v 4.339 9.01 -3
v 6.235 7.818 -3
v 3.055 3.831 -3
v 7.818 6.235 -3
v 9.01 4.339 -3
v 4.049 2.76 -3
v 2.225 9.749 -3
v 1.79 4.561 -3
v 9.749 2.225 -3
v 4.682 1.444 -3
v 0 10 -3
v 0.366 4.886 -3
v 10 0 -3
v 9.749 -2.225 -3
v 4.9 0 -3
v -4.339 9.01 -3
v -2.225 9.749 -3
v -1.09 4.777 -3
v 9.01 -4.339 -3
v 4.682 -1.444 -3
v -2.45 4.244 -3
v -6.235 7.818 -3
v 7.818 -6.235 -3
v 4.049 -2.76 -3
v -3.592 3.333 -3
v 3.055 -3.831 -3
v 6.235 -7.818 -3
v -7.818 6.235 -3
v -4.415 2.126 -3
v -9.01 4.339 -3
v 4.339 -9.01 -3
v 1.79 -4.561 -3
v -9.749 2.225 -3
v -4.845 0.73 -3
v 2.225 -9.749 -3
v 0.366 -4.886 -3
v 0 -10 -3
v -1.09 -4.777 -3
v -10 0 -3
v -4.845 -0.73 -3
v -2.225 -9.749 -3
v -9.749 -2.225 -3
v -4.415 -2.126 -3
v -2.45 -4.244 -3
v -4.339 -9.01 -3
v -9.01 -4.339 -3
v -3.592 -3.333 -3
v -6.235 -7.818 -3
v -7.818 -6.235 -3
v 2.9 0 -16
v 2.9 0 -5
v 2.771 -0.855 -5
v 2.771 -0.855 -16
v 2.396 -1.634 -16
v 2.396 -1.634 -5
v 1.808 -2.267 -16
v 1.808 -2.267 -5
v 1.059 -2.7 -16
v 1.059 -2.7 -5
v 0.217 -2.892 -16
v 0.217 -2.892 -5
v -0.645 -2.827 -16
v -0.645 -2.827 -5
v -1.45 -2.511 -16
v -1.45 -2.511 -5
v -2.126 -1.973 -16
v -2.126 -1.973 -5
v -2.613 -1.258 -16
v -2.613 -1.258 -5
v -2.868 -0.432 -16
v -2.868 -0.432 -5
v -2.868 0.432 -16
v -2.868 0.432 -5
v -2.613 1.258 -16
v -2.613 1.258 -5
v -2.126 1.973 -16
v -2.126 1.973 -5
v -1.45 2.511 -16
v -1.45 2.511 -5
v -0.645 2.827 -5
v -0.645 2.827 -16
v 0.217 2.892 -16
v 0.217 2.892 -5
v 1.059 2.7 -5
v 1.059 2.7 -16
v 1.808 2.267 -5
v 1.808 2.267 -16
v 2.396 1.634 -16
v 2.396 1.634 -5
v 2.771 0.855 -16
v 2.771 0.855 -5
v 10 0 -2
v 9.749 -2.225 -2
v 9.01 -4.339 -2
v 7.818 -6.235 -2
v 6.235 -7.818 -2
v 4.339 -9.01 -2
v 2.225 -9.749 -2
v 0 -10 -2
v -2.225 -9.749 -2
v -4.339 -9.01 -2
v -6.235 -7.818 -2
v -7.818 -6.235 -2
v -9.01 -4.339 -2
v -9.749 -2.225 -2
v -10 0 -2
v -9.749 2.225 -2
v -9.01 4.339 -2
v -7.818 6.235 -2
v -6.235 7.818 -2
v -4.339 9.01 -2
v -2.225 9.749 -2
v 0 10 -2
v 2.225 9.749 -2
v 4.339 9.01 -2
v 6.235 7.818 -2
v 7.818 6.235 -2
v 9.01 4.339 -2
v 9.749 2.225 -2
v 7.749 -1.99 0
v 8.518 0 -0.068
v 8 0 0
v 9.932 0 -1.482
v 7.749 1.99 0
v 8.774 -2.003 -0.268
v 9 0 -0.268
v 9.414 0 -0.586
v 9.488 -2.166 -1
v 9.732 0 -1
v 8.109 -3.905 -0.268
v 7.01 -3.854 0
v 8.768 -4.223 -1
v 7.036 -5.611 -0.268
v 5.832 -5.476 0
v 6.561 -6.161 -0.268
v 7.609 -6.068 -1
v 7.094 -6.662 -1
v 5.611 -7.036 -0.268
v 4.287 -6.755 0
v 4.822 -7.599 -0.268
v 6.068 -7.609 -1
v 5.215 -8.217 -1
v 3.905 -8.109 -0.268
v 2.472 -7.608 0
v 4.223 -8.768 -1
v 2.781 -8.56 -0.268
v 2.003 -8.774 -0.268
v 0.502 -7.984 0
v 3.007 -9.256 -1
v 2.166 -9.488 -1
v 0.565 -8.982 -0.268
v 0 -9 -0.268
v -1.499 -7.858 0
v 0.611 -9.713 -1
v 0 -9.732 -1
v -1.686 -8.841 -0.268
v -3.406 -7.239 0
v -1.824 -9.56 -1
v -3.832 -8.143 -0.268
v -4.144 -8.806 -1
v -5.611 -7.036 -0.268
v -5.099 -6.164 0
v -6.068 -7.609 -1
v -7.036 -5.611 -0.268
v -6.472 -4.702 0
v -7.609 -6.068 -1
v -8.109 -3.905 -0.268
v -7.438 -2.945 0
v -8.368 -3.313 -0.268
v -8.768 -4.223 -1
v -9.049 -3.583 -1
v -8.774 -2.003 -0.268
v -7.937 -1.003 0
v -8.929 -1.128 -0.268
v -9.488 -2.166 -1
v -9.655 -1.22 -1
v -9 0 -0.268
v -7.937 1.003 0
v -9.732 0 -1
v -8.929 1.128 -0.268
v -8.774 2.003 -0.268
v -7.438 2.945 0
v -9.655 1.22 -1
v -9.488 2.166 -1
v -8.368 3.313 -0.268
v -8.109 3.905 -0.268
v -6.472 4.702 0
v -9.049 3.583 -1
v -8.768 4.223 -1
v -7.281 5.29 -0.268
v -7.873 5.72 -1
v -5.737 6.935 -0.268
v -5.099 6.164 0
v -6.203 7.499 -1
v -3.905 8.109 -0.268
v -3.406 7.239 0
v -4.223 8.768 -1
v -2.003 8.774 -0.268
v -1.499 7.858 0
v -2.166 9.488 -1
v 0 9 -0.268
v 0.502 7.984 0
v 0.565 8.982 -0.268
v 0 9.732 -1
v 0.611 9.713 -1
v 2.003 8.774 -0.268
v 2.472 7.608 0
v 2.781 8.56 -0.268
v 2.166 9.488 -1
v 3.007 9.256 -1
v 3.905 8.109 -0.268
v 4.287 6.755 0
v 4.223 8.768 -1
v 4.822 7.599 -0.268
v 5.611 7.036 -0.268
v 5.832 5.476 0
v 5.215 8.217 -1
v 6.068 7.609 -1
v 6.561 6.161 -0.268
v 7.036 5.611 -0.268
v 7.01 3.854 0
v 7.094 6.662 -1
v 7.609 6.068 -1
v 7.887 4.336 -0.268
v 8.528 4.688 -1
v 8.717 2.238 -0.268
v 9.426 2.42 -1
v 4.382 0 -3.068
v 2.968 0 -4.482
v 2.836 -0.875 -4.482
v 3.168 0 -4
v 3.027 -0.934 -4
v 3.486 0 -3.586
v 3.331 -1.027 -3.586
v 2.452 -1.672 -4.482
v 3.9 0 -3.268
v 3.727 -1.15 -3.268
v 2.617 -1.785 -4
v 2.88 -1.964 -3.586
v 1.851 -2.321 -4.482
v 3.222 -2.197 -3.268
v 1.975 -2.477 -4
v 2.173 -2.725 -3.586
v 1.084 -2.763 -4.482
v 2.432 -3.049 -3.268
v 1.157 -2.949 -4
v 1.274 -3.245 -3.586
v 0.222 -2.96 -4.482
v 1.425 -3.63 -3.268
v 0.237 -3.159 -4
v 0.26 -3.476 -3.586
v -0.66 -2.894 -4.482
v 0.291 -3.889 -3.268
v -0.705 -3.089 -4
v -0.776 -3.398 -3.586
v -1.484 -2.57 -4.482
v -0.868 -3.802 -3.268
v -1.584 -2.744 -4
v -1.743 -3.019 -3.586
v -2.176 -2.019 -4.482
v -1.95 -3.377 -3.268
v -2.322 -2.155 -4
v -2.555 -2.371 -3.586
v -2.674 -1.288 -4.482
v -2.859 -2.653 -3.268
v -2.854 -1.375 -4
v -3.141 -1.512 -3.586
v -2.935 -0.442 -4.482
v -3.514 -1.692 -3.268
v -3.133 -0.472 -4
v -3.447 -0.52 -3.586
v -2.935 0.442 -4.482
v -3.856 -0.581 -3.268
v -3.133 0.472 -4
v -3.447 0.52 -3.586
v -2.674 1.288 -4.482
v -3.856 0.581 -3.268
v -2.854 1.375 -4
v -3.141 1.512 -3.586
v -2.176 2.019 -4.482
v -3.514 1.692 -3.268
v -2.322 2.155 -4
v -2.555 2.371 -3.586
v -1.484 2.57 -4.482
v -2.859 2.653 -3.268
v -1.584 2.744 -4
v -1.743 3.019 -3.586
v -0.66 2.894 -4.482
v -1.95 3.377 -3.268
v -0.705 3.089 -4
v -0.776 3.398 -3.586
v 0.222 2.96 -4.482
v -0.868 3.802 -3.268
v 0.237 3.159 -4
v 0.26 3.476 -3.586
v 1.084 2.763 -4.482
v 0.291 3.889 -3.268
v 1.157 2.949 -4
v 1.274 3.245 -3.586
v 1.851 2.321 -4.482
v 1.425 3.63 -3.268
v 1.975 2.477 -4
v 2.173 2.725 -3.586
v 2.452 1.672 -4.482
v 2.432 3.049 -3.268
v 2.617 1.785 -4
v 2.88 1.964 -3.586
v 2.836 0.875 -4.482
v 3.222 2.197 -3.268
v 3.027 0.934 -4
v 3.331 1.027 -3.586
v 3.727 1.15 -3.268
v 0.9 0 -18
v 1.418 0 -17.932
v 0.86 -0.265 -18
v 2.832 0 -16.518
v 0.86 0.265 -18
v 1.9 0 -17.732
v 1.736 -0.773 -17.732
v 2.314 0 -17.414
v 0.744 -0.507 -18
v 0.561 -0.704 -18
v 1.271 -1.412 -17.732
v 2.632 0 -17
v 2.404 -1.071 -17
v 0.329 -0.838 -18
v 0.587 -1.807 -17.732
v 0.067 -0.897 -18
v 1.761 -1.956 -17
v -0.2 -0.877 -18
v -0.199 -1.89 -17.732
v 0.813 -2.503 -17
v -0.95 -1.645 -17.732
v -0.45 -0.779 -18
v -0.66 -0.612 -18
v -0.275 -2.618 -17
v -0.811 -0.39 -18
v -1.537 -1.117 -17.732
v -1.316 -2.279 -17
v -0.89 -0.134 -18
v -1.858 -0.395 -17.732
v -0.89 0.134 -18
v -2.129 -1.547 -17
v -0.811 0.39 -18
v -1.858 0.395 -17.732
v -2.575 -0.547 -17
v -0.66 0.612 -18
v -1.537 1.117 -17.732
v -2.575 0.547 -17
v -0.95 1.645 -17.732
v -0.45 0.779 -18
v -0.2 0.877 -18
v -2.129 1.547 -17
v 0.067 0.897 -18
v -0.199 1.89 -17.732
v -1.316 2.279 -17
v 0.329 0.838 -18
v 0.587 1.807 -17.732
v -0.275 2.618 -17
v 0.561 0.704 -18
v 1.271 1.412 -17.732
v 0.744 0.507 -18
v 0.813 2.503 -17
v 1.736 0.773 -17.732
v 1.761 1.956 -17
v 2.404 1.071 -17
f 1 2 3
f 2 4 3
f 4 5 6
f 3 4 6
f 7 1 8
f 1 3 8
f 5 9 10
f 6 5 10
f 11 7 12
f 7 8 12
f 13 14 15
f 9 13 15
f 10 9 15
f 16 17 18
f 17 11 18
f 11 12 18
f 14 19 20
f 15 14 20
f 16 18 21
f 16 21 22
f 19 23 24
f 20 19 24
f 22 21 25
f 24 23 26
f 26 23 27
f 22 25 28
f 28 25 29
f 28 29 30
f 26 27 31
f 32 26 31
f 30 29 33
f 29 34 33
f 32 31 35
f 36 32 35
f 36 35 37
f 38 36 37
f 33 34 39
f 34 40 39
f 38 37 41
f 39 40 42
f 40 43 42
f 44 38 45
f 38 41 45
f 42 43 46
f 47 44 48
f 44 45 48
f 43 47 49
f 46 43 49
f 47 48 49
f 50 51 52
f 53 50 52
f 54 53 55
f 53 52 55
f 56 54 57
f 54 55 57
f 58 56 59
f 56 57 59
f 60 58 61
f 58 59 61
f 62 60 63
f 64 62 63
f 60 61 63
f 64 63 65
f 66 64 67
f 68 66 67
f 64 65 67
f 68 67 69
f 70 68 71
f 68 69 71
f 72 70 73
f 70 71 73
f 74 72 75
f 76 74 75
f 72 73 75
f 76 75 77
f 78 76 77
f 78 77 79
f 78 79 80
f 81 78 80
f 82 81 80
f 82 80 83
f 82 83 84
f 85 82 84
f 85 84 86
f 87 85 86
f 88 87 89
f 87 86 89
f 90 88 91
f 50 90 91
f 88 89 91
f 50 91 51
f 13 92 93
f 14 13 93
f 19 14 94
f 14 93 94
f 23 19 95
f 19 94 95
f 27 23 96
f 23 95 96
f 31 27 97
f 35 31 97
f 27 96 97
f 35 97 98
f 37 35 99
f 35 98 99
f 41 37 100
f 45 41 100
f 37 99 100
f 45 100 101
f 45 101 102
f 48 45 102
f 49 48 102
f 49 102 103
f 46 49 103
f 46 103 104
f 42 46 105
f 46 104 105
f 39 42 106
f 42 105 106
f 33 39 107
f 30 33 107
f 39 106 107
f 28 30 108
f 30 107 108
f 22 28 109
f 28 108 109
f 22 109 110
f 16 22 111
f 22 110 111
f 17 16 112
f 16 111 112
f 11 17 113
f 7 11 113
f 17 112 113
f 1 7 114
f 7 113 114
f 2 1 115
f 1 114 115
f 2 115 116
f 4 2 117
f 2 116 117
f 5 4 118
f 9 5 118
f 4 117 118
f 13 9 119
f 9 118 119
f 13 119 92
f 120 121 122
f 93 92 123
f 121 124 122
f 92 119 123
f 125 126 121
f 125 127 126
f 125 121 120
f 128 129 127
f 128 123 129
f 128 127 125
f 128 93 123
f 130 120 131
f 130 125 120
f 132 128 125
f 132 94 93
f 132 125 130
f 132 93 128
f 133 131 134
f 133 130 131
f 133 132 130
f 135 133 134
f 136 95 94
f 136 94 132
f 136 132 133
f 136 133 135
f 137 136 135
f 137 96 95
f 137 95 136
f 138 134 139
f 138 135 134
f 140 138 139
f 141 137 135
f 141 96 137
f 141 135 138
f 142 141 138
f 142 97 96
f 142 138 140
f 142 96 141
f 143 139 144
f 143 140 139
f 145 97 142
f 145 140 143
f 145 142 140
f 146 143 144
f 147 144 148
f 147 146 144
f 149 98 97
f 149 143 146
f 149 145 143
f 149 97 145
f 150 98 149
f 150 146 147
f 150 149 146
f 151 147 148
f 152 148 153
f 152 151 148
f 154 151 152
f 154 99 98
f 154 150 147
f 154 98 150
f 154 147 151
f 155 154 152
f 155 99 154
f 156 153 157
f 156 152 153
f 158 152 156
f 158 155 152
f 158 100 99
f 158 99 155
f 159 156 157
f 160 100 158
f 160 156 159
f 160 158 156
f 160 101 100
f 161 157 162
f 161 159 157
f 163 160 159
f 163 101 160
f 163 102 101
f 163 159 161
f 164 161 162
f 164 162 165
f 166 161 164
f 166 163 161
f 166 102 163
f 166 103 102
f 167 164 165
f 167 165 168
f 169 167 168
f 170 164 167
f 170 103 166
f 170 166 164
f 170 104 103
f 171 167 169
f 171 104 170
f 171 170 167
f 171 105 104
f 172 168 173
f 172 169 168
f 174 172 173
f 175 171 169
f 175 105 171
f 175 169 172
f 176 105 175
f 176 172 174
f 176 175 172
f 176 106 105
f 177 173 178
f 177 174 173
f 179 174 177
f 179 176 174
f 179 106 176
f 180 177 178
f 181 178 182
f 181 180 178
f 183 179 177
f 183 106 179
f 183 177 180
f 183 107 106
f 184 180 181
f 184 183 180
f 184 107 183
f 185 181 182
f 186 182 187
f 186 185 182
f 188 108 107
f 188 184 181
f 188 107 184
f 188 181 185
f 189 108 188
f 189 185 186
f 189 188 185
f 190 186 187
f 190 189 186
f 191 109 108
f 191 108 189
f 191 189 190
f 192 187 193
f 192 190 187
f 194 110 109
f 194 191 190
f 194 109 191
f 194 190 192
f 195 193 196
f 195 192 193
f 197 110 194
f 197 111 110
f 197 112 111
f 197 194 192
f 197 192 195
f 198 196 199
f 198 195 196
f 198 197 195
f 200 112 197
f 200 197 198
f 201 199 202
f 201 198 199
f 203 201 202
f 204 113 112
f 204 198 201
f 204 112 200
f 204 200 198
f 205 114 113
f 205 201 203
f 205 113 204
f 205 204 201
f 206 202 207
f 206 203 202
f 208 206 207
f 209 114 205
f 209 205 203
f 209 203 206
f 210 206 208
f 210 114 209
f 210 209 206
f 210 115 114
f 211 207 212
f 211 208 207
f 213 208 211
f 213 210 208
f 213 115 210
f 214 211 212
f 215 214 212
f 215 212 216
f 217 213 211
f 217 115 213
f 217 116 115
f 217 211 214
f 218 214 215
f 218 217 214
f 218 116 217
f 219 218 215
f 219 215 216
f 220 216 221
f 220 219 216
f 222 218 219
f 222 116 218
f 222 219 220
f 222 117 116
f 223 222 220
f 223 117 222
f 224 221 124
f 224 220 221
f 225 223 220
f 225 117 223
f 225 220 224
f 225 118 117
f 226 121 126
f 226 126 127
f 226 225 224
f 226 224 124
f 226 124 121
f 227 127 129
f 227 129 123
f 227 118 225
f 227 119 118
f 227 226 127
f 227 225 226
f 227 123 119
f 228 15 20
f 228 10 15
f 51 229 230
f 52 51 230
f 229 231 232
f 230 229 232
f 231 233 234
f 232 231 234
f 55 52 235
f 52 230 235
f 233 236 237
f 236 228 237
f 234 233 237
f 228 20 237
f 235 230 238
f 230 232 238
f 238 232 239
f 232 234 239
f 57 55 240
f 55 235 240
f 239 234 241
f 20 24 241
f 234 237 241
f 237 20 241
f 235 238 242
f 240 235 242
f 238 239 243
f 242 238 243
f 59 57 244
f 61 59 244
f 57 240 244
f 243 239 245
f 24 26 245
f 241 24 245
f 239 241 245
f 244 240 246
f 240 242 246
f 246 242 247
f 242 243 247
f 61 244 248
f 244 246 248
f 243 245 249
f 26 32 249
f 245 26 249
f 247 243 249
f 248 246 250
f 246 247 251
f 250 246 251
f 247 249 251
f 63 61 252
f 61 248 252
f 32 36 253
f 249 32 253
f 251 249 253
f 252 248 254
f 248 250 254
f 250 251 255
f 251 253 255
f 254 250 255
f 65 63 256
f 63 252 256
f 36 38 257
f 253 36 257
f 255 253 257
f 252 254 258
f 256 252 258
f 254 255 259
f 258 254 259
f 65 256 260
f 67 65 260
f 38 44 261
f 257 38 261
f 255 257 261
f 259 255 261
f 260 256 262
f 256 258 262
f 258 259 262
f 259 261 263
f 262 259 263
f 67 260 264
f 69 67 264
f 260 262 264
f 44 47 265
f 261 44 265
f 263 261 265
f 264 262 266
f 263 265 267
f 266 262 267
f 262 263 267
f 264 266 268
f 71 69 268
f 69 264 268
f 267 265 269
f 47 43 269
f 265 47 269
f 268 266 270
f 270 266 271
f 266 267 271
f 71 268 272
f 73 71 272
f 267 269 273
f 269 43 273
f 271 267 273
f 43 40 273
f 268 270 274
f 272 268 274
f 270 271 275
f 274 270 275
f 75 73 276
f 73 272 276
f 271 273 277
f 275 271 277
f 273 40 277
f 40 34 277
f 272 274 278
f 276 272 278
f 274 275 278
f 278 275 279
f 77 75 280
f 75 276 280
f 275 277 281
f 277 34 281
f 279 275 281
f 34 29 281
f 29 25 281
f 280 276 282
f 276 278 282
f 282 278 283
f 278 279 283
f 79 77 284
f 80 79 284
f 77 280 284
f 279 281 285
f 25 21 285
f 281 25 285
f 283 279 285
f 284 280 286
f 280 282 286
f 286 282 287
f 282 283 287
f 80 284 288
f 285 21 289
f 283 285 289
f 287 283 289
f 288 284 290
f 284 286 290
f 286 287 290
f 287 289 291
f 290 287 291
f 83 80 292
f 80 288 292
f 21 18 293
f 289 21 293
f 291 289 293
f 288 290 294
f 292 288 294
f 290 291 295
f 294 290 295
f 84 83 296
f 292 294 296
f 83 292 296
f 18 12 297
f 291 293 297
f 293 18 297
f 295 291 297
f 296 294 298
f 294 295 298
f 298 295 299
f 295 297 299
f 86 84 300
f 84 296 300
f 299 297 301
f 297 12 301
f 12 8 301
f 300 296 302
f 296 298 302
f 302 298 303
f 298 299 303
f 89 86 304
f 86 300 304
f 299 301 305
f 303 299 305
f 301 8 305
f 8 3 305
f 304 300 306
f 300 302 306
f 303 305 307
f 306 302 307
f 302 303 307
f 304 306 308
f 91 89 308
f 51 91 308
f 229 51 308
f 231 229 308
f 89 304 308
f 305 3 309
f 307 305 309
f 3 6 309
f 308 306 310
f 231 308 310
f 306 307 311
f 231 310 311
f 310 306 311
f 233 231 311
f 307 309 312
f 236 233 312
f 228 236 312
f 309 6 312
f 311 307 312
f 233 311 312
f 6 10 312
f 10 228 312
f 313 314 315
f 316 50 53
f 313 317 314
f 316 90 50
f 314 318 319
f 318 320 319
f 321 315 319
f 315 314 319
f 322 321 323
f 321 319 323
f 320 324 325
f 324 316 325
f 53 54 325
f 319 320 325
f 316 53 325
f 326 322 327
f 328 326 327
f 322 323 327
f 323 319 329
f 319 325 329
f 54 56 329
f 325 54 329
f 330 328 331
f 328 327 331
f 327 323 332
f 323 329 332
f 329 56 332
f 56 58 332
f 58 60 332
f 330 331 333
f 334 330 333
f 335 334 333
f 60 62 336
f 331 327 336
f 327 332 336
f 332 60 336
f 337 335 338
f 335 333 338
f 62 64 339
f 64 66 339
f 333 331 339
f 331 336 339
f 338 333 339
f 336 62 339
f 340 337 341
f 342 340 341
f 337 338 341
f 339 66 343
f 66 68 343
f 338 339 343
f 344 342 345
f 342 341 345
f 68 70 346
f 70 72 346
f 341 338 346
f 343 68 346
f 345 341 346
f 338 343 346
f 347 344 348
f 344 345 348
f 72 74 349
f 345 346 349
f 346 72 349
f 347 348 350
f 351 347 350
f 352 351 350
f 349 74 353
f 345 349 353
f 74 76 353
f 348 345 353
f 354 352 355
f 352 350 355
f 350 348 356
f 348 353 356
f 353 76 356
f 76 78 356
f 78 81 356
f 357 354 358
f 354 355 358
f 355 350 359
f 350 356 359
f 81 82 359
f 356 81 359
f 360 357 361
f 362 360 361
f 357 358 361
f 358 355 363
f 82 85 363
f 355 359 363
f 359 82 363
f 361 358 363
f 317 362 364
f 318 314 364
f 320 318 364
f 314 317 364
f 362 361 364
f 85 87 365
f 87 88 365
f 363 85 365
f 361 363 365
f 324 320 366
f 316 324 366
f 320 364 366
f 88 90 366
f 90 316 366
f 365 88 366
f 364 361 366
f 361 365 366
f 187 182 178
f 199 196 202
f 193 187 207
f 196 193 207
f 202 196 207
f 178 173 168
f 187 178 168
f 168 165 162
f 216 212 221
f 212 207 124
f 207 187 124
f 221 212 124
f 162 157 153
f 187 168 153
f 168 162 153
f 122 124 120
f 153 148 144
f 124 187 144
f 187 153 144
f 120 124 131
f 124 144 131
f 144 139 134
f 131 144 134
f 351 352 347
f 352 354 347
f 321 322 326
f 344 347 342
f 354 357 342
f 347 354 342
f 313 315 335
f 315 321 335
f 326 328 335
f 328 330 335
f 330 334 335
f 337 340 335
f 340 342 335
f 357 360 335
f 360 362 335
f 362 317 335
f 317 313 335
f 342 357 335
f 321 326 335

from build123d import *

# Parameters (mm, degrees)
F2_R = 2


with BuildPart() as f1:
    # F0 (on Front) → F1 (revolve)
    with BuildSketch(Plane.XZ):
        Polygon((10, 0), (0, 0), (0, -3), (0, -18), (2.9, -18), (2.9, -3), (10, -3), align=None)
    revolve(axis=Axis((0, 0, -11.278831), (0, 0, -1)))

    # F2
    f2_edges = [f1.edges().sort_by_distance(p)[0] for p in [
        (-2.9, 0, -18),
        (-10, 0, 0),
        (-2.9, 0, -3),
        (2.9, 0, -10.5),
    ]]
    fillet(f2_edges, radius=F2_R)


solid = f1.part
